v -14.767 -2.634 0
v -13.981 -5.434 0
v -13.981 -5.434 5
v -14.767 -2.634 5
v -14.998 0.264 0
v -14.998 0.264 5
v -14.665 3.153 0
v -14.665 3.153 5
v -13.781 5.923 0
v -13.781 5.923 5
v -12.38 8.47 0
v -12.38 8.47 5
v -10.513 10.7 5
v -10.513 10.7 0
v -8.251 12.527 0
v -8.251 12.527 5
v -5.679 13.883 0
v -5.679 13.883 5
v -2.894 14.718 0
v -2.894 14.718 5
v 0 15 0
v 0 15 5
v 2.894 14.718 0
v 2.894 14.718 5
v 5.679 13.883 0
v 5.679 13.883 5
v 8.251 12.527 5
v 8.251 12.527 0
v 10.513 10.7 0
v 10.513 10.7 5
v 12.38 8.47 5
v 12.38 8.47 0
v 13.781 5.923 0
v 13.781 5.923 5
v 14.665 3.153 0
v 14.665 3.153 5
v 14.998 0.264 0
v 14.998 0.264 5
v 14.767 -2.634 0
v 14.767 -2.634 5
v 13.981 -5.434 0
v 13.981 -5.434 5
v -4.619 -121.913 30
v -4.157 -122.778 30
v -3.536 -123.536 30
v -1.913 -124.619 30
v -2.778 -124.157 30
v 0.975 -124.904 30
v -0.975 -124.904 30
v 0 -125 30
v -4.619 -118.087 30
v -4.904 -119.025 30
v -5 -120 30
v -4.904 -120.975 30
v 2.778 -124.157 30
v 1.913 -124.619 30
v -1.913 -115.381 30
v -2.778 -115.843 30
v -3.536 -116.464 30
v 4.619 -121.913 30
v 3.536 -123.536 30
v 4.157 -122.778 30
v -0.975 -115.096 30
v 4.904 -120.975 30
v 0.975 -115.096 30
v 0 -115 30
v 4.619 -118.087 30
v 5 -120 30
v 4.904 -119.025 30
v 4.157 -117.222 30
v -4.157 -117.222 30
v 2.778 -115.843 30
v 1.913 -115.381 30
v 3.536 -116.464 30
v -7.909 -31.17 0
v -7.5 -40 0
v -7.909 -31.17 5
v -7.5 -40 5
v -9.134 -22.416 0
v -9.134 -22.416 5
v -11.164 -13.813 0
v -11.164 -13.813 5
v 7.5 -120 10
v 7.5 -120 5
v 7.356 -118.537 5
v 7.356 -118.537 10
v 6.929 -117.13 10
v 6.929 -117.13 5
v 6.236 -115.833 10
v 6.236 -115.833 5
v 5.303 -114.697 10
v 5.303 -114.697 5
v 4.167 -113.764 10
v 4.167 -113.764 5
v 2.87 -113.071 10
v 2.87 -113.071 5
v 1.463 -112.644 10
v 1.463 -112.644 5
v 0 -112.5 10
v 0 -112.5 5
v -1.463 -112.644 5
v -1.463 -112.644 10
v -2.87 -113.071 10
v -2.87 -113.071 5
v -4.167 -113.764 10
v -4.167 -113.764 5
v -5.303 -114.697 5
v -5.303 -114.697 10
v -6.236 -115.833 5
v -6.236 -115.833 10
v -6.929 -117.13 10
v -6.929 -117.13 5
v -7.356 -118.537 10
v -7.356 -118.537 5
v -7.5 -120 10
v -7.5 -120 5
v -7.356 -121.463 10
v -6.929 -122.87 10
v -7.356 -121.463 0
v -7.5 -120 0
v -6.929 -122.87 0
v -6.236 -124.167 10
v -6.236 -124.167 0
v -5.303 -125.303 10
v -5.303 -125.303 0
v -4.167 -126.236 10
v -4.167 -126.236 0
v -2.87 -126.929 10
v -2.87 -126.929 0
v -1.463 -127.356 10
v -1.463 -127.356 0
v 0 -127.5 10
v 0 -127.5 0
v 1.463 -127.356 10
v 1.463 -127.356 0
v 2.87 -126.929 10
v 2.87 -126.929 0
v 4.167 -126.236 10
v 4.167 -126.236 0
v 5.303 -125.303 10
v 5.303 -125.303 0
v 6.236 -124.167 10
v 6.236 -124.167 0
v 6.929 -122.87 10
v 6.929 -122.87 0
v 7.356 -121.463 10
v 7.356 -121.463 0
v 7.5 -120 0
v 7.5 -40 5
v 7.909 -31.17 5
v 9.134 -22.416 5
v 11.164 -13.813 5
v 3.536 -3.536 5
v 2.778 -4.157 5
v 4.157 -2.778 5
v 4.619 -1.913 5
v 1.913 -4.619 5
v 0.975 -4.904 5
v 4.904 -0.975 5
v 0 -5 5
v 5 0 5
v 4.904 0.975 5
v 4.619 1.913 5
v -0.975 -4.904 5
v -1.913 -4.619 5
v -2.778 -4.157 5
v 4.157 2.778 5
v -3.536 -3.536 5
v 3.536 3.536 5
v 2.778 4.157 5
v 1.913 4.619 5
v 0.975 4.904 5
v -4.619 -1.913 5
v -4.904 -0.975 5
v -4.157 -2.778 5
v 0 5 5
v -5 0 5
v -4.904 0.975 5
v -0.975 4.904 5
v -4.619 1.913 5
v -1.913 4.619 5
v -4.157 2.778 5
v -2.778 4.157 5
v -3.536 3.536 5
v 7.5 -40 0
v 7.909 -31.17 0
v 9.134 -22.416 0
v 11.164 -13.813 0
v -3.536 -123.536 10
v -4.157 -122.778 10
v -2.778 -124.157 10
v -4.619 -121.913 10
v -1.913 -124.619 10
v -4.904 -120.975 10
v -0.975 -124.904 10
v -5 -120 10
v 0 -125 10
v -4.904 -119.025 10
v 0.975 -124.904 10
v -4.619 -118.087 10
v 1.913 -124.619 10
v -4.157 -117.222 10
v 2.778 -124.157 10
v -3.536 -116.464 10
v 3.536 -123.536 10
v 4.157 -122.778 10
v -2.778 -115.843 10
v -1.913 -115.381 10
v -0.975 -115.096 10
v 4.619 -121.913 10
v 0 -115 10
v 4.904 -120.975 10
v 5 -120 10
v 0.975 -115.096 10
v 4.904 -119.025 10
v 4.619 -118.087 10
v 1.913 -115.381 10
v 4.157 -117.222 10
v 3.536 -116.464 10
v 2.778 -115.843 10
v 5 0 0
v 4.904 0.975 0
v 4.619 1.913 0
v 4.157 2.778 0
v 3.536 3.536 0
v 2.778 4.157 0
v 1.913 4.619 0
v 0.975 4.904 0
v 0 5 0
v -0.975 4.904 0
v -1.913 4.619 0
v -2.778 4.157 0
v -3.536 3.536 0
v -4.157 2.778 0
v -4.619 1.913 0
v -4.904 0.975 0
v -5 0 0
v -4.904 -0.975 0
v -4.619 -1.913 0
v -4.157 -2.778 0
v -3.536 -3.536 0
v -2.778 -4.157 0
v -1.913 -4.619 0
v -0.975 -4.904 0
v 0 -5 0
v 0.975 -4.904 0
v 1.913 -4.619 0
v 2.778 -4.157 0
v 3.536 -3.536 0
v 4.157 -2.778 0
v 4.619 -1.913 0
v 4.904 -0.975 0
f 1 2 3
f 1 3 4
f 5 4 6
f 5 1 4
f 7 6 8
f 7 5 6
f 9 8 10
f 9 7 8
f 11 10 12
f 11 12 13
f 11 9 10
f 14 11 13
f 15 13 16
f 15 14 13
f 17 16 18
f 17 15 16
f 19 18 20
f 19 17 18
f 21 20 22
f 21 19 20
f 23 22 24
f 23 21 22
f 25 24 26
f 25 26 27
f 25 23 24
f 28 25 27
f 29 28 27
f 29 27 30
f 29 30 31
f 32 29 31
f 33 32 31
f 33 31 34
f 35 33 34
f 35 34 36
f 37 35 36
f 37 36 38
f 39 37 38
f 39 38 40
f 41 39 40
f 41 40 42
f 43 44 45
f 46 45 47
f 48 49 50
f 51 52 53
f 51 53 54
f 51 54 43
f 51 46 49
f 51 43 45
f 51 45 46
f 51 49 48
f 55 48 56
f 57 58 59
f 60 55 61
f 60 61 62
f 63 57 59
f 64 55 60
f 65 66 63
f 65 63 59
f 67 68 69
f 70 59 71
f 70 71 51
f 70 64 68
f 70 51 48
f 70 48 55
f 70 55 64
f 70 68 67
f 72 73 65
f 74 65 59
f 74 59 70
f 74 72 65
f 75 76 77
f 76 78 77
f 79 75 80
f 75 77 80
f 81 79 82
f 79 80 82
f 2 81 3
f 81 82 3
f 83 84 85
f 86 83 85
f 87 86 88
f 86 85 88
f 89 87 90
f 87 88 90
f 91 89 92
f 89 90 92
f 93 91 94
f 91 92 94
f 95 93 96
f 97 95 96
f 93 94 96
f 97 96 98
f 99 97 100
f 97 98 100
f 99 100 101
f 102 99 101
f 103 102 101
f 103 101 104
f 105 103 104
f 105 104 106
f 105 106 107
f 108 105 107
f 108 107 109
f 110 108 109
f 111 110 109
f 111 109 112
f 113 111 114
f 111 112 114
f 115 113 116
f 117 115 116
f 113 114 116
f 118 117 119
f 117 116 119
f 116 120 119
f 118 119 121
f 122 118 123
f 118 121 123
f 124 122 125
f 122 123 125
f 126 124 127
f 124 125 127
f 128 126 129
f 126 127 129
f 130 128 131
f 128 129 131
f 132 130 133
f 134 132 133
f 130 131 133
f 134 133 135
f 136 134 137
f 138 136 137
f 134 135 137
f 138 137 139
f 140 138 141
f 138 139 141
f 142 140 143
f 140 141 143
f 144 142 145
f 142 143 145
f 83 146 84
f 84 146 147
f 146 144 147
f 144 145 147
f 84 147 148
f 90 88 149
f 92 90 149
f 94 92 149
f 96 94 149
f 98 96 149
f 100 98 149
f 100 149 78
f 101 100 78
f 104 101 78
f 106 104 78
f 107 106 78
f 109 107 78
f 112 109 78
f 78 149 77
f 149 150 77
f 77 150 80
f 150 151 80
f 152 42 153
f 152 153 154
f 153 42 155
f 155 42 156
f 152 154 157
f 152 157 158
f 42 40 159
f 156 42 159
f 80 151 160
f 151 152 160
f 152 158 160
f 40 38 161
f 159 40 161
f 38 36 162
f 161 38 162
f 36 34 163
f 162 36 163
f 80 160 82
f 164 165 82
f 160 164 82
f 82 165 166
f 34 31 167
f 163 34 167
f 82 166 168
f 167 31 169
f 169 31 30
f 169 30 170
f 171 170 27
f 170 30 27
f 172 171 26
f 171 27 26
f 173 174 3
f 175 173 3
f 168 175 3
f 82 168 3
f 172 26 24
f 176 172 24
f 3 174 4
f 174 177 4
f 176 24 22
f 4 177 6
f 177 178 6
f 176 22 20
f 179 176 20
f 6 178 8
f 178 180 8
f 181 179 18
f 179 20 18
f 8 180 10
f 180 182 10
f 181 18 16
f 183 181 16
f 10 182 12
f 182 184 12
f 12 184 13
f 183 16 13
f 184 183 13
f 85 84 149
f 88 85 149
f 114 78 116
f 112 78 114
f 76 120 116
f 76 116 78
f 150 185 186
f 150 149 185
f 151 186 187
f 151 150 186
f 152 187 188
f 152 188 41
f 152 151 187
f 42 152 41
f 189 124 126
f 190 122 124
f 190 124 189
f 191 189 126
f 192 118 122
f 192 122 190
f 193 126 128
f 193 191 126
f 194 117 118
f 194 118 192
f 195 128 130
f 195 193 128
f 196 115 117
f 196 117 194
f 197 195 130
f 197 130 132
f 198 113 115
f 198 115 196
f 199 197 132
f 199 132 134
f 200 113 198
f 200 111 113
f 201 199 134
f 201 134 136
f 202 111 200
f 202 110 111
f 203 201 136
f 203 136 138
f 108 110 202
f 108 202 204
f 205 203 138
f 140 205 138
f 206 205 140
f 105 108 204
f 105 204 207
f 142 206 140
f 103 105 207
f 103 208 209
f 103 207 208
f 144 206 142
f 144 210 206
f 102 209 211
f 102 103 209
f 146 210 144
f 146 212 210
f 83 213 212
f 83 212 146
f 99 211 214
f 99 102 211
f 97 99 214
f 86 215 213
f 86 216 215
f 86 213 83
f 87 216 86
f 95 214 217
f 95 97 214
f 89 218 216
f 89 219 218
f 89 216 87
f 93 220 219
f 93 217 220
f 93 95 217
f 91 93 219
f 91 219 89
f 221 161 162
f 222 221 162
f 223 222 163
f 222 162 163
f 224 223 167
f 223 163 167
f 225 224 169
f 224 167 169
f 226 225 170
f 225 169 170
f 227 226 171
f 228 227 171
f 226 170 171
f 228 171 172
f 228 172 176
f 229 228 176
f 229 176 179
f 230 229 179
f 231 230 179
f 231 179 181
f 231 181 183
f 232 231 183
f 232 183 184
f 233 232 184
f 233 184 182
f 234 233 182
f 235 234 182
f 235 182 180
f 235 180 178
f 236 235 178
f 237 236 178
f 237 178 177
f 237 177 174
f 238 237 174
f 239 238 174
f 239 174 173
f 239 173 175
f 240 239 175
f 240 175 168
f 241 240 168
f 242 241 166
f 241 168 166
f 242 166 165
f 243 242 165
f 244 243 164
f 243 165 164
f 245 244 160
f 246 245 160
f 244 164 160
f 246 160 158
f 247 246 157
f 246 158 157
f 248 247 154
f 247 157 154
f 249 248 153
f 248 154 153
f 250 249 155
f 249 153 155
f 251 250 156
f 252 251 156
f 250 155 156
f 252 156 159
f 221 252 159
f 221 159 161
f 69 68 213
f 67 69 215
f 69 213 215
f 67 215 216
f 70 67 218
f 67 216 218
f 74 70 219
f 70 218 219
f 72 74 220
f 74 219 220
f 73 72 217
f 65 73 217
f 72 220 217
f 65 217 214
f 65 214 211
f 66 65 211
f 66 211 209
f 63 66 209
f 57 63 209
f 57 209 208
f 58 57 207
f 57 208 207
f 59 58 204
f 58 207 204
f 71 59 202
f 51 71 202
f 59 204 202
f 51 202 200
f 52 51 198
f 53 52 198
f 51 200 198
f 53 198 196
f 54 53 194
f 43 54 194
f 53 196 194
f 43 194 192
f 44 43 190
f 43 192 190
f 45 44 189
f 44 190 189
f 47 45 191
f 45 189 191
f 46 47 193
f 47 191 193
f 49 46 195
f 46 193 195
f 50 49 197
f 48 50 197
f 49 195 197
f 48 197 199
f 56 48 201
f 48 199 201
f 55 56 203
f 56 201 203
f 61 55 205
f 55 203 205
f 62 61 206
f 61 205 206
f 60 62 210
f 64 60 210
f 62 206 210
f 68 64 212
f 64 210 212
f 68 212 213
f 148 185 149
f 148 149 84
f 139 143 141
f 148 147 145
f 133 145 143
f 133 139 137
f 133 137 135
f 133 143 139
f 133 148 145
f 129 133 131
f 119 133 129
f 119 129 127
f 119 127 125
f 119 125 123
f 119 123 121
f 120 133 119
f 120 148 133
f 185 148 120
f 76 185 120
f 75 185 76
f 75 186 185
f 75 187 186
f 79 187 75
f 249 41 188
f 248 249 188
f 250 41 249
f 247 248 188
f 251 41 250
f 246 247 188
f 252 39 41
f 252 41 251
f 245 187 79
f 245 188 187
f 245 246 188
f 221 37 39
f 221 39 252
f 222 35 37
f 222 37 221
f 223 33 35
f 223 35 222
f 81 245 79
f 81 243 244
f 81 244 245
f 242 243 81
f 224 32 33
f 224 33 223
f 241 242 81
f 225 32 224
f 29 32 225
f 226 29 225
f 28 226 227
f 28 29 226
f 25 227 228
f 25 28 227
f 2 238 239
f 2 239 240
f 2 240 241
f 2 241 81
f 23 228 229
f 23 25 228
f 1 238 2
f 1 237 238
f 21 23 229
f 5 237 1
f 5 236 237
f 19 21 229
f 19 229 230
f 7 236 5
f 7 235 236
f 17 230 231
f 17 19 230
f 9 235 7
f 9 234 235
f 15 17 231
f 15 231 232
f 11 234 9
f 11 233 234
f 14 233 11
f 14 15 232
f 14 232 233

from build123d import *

# Parameters (mm, degrees)
BOSS_EXTRUDE1_DEPTH            = 5
SKETCH2_R                      = 7.5
BOSS_EXTRUDE2_DEPTH            = 5
SKETCH3_R                      = 5
BOSS_EXTRUDE3_DEPTH            = 20
F_10_0_10_DIAMETER_HOLE1_D     = 10
F_10_0_10_DIAMETER_HOLE1_DEPTH = 30
FILLET1_R                      = 95.416666667


with BuildPart() as part:
    # Sketch1 → Boss-Extrude1 (new body)
    with BuildSketch(Plane(origin=(0, 0, 0), x_dir=(-1, 0, 0), z_dir=(0, 0, -1))):
        with BuildLine():
            Line((7.499999998, -120), (7.499999998, -12.990381057))
            ThreePointArc((7.499999998, -12.990381057), (-1e-09, 15.000000001), (-7.5, -12.990381057))
            Line((-7.5, -12.990381057), (-7.5, -120))
            ThreePointArc((-7.5, -120), (-1e-09, -127.499999999), (7.499999998, -120))
        make_face()
    extrude(amount=-BOSS_EXTRUDE1_DEPTH)

    # Sketch2 → Boss-Extrude2 (add)
    with BuildSketch(Plane.XY.offset(5)):
        with Locations((0, -120)):
            Circle(SKETCH2_R)
    extrude(amount=BOSS_EXTRUDE2_DEPTH)

    # Sketch3 → Boss-Extrude3 (add)
    with BuildSketch(Plane.XY.offset(10)):
        with Locations((0, -120)):
            Circle(SKETCH3_R)
    extrude(amount=BOSS_EXTRUDE3_DEPTH)

    # Ø10.0 (10) Diameter Hole1
    with Locations(Plane(origin=(0, 0, 0), x_dir=(-1, 0, 0), z_dir=(0, 0, -1))):
        with Locations((0, 0)):
            Hole(F_10_0_10_DIAMETER_HOLE1_D / 2, depth=F_10_0_10_DIAMETER_HOLE1_DEPTH)

    # Fillet1
    fillet1_edges = [part.edges().sort_by_distance(p)[0] for p in [
        (7.5, -12.990381057, 2.5),
        (-7.499999998, -12.990381057, 2.5),
    ]]
    fillet(fillet1_edges, radius=FILLET1_R)


solid = part.part
